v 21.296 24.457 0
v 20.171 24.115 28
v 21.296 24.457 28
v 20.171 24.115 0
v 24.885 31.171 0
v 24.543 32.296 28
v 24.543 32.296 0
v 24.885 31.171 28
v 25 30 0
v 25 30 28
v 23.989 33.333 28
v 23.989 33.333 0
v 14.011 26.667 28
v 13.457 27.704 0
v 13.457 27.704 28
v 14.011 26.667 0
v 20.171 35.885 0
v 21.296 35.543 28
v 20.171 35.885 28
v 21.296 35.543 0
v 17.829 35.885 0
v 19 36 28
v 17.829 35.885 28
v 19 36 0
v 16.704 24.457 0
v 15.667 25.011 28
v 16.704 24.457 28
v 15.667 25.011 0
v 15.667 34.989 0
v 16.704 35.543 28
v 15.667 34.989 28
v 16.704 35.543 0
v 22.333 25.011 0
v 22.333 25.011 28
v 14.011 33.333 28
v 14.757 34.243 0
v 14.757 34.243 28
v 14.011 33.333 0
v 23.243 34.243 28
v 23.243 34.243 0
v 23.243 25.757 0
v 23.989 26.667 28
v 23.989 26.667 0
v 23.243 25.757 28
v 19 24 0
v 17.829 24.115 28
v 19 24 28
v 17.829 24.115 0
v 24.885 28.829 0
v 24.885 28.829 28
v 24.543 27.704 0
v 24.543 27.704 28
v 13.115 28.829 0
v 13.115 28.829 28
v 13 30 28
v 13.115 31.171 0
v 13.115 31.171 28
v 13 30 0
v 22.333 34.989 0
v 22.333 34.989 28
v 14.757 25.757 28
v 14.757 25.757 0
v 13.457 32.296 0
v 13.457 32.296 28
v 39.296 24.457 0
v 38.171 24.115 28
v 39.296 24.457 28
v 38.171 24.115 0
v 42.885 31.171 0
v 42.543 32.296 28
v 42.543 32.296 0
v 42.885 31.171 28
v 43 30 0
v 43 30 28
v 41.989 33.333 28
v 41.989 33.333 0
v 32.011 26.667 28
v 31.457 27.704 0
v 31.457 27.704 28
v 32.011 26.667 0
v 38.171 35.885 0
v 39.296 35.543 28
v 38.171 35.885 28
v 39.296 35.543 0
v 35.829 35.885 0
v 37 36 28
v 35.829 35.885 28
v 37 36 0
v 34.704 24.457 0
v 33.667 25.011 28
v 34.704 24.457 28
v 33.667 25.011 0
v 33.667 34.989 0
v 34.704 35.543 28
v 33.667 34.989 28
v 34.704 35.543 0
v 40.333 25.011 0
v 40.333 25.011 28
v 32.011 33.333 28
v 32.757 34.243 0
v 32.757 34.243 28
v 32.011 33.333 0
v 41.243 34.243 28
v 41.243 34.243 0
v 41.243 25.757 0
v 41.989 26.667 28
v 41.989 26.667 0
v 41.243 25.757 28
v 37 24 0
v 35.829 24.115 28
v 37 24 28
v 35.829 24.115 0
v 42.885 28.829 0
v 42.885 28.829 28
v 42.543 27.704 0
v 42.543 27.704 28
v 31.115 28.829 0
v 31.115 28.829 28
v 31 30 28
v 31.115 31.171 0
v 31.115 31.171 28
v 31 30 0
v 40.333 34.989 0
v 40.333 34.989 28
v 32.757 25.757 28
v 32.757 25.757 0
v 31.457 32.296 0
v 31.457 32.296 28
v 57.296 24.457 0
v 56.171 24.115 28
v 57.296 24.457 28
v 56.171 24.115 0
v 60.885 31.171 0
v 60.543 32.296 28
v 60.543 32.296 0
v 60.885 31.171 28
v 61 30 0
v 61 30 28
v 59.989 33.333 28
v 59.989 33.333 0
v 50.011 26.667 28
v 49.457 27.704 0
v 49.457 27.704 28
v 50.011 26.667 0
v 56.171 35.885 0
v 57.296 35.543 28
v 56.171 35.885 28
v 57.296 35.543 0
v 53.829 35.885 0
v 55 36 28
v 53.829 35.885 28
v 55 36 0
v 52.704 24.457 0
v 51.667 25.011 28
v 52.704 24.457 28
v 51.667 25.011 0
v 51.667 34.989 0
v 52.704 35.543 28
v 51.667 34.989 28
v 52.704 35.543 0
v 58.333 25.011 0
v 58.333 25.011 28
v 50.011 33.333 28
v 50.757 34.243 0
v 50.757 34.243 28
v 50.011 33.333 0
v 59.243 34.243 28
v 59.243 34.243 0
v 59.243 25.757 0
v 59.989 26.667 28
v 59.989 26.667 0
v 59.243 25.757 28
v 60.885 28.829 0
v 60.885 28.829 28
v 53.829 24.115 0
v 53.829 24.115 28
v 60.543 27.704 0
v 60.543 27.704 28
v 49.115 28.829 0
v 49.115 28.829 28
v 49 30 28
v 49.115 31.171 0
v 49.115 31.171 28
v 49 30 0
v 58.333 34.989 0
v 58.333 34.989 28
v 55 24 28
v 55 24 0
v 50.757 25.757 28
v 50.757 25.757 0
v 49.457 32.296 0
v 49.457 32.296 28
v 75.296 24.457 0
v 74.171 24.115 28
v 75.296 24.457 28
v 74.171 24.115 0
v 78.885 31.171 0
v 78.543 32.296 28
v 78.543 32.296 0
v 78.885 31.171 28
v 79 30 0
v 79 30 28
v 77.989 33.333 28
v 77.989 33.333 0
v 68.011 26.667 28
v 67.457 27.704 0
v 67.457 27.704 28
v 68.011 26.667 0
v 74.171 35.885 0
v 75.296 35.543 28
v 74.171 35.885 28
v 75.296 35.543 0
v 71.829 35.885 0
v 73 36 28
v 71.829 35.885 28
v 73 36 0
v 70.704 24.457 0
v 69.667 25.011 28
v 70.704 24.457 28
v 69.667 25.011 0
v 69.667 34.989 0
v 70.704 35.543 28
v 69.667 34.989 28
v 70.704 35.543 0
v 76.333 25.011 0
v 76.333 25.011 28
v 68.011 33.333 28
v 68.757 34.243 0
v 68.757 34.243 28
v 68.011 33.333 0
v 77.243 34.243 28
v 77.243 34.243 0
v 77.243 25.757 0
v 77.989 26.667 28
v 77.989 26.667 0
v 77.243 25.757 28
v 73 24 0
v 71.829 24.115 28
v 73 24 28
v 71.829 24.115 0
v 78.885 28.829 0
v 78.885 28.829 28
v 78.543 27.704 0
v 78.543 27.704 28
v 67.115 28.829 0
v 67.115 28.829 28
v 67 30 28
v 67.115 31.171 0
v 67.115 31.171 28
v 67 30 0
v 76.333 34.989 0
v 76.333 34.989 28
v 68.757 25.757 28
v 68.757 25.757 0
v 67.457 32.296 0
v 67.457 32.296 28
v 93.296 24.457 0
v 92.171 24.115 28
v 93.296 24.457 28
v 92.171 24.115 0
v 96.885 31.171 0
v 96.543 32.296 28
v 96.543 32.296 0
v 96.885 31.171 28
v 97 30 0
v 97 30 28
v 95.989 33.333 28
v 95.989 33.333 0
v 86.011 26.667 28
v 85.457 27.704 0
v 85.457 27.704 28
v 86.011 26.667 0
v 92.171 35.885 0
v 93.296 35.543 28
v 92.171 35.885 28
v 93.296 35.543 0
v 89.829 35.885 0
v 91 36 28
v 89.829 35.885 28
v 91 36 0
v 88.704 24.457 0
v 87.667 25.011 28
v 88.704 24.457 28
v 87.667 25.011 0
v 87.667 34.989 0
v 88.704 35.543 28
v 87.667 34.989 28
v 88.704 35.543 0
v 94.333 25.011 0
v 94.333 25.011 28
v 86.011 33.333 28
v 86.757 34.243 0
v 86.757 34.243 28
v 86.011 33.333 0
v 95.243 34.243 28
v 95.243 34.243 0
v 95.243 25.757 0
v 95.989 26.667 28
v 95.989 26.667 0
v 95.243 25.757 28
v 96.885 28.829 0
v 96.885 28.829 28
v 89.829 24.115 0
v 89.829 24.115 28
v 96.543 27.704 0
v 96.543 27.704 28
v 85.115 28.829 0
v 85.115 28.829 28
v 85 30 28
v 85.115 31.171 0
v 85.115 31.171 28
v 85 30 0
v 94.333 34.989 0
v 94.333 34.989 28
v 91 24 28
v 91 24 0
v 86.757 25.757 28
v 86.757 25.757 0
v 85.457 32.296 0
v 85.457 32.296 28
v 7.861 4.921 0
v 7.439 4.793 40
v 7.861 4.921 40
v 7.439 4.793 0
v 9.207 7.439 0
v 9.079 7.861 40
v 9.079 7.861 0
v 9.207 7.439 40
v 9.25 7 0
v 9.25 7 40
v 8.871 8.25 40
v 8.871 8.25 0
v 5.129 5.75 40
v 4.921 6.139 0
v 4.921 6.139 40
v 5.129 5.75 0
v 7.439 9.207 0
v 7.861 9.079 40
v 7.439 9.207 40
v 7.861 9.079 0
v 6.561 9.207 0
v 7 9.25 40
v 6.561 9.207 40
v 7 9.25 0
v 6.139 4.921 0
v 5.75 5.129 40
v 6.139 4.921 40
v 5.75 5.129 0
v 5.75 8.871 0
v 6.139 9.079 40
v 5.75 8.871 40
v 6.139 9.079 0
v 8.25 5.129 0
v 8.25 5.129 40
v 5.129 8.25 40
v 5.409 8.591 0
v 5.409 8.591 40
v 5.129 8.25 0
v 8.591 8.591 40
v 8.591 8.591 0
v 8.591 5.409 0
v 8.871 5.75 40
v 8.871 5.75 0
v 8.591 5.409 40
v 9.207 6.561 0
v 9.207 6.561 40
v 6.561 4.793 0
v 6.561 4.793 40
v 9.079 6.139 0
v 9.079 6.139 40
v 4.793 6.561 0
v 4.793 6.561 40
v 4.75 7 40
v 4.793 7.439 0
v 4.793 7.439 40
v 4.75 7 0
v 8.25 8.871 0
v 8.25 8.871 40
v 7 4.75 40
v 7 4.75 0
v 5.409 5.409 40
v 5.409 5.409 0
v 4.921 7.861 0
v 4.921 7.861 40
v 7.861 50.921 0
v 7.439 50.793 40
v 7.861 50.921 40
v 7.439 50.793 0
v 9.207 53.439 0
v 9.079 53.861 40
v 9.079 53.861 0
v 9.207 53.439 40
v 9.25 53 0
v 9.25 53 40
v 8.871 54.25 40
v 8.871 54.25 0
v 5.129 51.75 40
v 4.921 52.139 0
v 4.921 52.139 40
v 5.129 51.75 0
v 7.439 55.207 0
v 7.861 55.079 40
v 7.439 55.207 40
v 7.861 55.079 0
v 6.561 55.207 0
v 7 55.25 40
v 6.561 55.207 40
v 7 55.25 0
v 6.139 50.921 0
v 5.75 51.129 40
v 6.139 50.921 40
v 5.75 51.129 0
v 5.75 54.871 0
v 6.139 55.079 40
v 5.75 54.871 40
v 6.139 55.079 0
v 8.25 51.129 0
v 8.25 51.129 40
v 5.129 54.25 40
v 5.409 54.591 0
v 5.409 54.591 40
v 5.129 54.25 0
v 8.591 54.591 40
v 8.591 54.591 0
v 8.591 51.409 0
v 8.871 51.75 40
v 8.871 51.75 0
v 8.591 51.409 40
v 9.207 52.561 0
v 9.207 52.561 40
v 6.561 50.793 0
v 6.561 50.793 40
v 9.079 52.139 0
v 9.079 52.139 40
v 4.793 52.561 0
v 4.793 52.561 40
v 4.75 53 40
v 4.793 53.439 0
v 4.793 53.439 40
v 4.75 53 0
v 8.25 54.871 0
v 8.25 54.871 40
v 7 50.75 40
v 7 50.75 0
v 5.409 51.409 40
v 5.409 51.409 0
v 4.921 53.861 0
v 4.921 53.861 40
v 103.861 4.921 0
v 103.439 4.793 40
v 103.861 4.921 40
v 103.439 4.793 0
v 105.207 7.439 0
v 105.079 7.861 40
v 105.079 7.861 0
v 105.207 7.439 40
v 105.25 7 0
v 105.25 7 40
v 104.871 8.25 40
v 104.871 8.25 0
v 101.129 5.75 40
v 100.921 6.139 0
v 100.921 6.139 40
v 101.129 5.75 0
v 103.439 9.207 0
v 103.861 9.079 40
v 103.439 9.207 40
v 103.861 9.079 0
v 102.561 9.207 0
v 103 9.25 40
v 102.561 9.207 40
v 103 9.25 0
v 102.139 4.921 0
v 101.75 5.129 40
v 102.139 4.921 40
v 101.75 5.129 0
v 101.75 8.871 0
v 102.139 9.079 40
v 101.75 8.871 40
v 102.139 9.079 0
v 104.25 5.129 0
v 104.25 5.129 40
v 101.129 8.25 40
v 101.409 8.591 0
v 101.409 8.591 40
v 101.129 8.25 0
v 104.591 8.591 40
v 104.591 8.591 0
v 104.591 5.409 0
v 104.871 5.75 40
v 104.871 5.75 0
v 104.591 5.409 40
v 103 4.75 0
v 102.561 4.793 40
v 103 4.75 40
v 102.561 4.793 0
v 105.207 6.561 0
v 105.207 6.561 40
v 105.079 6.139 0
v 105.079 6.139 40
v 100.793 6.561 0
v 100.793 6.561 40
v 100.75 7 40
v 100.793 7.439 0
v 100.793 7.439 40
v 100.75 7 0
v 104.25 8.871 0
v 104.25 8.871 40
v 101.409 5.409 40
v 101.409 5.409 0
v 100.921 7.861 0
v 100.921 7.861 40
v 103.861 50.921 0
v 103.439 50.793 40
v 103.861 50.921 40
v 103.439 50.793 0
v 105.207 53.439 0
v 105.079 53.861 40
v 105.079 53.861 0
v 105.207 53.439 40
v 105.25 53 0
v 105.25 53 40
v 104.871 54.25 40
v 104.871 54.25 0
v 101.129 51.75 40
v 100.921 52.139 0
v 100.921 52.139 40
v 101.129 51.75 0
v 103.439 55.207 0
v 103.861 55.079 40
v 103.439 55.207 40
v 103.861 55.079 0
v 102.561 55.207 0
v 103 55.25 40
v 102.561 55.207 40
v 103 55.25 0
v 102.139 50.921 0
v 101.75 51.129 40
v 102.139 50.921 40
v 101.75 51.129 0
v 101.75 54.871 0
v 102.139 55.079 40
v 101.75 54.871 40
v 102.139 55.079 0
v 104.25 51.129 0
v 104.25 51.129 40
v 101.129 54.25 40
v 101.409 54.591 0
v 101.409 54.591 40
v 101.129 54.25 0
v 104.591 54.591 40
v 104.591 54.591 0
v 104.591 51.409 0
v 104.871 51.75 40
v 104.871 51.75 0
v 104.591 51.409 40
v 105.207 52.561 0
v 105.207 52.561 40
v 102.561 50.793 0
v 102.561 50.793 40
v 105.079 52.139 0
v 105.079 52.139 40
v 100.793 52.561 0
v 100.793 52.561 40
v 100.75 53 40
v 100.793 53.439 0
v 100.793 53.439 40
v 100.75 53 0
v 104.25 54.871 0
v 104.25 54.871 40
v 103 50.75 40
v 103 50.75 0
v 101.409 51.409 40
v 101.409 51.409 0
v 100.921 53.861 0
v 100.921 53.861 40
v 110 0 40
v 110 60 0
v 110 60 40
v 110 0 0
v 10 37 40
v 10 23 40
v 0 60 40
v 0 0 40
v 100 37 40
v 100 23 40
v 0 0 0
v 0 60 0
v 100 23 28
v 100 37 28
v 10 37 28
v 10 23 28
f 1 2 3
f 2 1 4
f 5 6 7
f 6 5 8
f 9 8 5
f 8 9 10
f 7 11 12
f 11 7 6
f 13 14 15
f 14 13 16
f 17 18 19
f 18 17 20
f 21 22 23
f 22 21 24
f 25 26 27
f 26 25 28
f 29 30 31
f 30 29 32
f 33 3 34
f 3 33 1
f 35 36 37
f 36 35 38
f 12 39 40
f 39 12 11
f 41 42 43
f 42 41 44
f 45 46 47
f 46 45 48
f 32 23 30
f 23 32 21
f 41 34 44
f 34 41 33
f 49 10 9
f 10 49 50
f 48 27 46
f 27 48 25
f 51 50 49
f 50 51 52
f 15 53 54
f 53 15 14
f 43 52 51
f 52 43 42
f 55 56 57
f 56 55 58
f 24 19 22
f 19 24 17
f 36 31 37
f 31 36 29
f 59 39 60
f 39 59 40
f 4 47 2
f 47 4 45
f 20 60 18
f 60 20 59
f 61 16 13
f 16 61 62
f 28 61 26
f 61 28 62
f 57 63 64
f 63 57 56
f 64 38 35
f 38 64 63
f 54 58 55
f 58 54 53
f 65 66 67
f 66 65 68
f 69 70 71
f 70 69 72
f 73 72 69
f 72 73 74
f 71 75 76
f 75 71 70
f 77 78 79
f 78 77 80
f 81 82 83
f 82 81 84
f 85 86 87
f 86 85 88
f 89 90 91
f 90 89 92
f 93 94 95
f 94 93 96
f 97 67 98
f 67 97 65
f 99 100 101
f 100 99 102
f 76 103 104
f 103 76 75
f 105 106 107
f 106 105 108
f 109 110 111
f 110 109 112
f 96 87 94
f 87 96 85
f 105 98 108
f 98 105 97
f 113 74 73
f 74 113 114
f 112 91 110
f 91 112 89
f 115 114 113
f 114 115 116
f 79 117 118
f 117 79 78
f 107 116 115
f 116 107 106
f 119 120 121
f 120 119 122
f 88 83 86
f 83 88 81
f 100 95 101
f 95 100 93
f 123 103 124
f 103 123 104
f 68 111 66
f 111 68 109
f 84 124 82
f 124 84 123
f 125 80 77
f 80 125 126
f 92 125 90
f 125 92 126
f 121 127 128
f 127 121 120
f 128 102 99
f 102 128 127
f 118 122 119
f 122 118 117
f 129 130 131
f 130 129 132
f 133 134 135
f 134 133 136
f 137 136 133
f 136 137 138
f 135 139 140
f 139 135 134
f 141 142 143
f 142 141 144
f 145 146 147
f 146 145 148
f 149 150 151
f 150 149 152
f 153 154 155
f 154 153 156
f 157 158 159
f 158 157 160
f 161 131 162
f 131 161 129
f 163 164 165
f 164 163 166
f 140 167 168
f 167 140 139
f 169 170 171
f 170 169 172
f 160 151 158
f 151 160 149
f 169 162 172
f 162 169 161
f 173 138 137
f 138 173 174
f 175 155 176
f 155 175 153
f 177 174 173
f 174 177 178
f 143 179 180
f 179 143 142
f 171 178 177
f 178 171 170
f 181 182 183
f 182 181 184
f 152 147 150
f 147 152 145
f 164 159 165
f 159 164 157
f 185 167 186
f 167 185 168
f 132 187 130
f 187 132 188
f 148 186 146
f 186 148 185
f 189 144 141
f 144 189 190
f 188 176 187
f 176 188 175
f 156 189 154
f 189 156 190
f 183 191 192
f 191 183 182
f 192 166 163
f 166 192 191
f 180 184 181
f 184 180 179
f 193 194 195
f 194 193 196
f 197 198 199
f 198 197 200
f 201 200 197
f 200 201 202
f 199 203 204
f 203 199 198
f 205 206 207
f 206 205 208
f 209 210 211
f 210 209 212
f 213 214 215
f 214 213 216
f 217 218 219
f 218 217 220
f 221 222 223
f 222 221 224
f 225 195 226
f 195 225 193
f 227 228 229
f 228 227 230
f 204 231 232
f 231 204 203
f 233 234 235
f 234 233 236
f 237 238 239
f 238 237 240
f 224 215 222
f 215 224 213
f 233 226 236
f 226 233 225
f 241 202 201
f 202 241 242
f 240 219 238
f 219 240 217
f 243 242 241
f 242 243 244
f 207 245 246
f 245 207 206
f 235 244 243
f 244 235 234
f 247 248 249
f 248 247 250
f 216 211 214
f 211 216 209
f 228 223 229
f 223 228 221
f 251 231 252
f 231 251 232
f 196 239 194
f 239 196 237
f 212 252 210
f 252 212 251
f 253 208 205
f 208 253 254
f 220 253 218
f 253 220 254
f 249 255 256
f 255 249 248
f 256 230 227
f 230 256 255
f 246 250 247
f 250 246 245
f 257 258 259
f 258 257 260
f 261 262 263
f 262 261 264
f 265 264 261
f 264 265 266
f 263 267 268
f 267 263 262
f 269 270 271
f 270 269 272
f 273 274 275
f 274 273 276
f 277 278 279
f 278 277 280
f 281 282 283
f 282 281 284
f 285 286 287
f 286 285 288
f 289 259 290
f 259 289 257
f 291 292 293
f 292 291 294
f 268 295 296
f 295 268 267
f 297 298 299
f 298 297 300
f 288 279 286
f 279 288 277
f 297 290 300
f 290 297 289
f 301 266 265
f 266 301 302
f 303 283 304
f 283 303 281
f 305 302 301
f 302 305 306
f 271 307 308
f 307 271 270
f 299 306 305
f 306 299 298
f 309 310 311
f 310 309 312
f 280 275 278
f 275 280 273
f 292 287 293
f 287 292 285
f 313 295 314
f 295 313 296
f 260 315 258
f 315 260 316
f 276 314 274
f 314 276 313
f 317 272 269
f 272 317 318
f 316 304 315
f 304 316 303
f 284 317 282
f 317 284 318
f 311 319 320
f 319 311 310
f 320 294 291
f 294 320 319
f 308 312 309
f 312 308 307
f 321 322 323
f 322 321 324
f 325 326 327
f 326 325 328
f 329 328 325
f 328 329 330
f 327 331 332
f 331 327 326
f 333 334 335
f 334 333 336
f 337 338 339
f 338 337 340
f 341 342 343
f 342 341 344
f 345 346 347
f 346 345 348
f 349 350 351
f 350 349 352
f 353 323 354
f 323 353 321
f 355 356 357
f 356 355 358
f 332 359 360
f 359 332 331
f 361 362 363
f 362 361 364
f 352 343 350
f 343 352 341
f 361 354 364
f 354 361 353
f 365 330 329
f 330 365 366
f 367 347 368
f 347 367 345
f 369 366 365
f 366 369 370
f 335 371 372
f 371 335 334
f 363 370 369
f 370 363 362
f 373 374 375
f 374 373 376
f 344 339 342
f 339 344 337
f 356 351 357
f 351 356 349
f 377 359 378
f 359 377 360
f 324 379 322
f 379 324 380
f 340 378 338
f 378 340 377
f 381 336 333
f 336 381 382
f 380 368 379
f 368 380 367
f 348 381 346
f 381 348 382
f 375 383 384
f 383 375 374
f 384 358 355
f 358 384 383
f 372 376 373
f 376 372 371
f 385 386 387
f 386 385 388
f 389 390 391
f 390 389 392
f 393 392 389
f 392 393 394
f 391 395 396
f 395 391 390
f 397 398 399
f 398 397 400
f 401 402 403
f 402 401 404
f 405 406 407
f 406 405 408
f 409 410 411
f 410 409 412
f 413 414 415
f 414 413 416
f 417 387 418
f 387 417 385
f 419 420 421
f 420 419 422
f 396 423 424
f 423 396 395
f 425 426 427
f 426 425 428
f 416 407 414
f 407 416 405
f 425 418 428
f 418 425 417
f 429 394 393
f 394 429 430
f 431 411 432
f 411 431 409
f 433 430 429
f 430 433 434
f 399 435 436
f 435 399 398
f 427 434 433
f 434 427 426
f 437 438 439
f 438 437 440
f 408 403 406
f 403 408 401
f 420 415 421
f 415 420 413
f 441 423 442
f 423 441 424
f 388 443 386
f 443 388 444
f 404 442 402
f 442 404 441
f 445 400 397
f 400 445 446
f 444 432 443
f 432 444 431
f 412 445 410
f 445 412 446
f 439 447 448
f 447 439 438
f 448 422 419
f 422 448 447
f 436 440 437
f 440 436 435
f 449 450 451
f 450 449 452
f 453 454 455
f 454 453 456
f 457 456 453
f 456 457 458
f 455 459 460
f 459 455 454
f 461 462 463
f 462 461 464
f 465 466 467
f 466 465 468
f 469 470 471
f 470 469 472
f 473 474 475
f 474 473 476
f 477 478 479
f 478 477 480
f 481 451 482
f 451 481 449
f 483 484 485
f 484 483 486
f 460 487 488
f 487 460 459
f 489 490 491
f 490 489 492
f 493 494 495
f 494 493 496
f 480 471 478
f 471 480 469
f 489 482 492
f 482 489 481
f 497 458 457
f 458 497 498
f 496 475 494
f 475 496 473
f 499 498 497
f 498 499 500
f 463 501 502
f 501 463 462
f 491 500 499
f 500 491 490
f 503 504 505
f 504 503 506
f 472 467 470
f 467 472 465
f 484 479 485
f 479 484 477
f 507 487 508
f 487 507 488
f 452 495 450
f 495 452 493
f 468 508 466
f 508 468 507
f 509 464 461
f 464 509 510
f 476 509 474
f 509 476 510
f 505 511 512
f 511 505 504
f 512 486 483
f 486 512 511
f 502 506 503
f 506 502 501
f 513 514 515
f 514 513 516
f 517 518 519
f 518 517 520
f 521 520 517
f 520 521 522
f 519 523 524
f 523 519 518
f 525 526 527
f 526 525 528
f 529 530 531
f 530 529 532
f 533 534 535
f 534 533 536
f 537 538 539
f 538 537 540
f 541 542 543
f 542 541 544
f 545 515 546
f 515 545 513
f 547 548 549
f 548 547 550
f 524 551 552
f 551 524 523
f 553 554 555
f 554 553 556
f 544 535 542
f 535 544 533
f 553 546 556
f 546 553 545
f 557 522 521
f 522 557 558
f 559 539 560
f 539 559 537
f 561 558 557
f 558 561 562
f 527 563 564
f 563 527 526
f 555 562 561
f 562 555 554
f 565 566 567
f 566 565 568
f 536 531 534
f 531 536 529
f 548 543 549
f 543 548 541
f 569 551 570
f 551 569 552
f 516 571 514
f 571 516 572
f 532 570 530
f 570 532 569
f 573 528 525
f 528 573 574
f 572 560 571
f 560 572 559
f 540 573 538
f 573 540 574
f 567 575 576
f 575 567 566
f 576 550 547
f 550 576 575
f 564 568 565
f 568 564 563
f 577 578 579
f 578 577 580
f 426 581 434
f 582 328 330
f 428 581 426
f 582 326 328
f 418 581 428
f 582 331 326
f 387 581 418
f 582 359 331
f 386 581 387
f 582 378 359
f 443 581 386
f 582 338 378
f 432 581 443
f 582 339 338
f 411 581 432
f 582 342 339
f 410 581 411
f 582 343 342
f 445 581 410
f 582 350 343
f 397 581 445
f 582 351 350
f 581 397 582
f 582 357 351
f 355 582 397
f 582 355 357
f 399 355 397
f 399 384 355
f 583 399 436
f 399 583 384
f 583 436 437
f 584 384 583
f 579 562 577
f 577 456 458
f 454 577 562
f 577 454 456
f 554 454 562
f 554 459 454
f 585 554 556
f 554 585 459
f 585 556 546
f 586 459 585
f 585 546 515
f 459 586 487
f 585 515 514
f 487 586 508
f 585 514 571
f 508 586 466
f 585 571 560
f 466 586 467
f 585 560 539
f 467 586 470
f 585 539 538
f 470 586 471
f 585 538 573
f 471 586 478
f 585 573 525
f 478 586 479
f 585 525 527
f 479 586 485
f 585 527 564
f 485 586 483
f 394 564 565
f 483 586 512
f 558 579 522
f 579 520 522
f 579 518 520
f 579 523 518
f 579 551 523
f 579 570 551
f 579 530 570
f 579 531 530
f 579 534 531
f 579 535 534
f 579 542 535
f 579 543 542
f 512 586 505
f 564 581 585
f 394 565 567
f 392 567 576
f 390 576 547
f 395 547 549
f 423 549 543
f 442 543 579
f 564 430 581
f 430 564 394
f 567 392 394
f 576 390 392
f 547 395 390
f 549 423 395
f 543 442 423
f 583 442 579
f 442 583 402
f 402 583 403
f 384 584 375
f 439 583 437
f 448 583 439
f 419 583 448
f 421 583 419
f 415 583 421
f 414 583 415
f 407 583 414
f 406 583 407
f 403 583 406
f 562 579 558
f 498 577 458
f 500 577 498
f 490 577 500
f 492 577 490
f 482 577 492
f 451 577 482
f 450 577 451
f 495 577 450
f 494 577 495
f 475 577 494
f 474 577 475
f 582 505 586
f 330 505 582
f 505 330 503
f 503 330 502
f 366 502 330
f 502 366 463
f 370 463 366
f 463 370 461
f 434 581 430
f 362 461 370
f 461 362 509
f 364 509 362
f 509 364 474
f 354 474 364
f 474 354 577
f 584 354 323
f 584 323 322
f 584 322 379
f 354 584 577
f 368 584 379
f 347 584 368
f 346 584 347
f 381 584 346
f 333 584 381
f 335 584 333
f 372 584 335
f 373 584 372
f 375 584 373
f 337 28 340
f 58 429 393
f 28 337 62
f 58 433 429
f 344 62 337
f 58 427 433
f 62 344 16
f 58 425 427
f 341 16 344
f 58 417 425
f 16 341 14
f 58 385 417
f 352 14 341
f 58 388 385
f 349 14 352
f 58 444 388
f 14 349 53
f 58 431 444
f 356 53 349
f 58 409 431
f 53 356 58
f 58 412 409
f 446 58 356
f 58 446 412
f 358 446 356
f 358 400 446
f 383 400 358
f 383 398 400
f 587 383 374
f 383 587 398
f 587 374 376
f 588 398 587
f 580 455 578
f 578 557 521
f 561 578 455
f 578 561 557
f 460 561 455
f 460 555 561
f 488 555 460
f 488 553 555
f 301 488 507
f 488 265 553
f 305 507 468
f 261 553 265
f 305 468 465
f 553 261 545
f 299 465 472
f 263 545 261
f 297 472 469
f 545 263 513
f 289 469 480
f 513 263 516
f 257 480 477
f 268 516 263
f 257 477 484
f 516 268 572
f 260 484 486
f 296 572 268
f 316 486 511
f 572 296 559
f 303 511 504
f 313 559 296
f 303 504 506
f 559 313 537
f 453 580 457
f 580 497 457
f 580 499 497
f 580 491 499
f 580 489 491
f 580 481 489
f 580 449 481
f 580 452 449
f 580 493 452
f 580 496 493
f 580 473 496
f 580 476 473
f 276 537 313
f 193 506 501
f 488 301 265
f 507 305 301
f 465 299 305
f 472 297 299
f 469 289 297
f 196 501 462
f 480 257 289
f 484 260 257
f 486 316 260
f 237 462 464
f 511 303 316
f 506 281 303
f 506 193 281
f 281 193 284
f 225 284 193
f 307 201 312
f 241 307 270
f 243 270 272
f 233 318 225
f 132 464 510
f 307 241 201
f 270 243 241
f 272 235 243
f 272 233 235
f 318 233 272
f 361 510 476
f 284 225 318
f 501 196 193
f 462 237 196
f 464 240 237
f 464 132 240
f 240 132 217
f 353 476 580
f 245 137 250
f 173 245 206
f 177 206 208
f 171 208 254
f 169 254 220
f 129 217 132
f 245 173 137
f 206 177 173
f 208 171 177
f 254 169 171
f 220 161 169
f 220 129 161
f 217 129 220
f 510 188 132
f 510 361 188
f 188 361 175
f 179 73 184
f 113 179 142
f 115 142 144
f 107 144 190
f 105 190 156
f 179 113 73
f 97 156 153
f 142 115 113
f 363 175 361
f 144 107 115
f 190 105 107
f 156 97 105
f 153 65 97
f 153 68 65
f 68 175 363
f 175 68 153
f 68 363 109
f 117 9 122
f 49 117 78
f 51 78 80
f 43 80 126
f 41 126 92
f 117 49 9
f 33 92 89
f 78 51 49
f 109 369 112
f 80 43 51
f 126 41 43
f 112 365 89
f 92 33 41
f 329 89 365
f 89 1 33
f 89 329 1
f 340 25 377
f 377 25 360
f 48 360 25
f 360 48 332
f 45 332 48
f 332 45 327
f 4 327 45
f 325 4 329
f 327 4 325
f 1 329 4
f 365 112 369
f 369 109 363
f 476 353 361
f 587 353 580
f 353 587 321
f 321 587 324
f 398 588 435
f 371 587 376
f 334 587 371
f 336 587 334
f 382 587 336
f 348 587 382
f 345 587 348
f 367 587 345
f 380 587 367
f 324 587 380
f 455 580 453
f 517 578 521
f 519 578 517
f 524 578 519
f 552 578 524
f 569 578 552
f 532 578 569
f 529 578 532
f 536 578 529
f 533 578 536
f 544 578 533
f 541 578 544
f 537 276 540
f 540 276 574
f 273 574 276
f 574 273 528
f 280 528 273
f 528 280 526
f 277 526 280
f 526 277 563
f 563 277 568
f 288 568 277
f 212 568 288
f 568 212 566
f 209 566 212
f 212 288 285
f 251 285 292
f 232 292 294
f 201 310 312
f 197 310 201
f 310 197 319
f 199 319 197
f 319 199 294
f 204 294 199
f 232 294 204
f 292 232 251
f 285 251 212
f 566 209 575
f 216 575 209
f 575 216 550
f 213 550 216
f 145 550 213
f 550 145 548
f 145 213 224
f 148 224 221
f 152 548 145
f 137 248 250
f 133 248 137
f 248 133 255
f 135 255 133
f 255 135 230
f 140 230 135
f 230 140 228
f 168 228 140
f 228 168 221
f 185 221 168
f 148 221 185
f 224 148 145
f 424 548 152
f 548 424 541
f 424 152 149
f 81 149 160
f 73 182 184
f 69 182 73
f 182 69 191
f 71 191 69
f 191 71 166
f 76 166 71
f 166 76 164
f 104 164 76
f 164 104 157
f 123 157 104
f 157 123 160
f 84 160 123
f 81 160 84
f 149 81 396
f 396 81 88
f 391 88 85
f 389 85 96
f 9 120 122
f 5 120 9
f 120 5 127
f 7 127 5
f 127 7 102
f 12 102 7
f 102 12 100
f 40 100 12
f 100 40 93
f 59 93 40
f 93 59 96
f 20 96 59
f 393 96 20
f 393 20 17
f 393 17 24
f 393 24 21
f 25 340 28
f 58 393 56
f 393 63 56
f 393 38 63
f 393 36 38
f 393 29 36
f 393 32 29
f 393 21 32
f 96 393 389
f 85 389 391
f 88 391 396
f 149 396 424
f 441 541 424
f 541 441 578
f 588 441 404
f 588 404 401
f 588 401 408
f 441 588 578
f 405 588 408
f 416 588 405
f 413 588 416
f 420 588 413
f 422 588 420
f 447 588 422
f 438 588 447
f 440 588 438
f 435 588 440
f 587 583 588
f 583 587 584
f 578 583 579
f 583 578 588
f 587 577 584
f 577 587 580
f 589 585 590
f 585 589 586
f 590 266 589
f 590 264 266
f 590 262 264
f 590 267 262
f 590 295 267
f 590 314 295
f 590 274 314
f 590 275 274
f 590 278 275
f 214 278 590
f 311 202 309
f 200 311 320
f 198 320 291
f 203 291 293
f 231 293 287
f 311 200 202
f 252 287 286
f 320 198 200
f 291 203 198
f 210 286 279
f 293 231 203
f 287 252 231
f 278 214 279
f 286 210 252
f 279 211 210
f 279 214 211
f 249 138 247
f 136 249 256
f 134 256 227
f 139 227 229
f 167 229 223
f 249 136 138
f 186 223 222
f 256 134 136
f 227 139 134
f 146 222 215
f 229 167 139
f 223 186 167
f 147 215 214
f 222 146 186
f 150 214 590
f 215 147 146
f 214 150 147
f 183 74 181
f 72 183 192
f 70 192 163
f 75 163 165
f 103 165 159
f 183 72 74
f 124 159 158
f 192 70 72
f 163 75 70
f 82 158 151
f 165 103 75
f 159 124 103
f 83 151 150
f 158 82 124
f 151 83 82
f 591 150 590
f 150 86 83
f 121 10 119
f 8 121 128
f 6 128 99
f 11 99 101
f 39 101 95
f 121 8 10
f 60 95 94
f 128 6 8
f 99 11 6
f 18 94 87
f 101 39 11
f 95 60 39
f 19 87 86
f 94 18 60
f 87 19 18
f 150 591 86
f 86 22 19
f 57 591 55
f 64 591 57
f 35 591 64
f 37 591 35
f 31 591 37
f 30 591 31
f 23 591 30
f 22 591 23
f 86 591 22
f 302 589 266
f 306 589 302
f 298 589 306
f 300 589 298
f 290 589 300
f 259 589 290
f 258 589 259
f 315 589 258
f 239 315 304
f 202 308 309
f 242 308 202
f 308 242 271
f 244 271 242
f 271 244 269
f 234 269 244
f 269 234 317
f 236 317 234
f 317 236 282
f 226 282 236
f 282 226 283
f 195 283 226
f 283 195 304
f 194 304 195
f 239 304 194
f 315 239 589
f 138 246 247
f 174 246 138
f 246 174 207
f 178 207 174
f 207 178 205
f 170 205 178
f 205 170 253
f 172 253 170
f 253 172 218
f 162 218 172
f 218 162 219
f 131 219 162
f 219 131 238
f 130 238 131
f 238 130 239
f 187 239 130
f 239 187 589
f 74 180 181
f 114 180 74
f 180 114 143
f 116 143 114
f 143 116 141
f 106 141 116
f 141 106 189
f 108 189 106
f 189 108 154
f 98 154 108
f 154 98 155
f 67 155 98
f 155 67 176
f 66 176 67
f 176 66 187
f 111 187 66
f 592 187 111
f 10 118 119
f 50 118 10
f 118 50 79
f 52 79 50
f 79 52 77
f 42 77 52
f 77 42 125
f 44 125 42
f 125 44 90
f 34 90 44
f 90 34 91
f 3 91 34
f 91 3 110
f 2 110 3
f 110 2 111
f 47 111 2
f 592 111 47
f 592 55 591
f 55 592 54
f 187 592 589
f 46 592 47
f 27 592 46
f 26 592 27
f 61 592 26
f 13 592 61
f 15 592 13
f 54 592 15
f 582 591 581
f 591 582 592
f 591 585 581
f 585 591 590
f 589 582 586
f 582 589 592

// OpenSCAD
$fn = 32;

// ----------------------------------------------------------------------
// Manifold block: gallery_top manifold
// ----------------------------------------------------------------------

// --- parameters (mm) ---
block_l = 110;            // block length, X
block_w = 60;             // block width, Y
block_h = 40;             // block height, Z
port_d = 12;              // port bore diameter
port_pitch = 18;          // port pitch along X
gallery_d = 14;           // top gallery width, Y
gallery_depth = 12;       // gallery pocket depth
wall_p = 10;              // gallery end wall thickness, X
mnt_d = 4.5;              // mounting hole diameter
mnt_in = 7;               // mounting hole inset from the edges
fit_tol = 0.1;            // tolerance for press fits, mm
free_tol = 0.3;           // tolerance for clearance fits, mm

n_ports = 5;  // ports in the row
port_x0 = (block_l - (n_ports - 1) * port_pitch) / 2;  // first port X

difference() {
  cube([block_l, block_w, block_h]);
  for (i = [0 : n_ports - 1])
    translate([port_x0 + i * port_pitch, block_w / 2, -1])
      cylinder(h = block_h + 2, d = port_d);
  translate([wall_p, block_w / 2 - gallery_d / 2, block_h - gallery_depth])
    cube([block_l - 2 * wall_p, gallery_d, gallery_depth + 1]);
  for (cx = [mnt_in, block_l - mnt_in])
    for (cy = [mnt_in, block_w - mnt_in])
      translate([cx, cy, -1]) cylinder(h = block_h + 2, d = mnt_d);
}
